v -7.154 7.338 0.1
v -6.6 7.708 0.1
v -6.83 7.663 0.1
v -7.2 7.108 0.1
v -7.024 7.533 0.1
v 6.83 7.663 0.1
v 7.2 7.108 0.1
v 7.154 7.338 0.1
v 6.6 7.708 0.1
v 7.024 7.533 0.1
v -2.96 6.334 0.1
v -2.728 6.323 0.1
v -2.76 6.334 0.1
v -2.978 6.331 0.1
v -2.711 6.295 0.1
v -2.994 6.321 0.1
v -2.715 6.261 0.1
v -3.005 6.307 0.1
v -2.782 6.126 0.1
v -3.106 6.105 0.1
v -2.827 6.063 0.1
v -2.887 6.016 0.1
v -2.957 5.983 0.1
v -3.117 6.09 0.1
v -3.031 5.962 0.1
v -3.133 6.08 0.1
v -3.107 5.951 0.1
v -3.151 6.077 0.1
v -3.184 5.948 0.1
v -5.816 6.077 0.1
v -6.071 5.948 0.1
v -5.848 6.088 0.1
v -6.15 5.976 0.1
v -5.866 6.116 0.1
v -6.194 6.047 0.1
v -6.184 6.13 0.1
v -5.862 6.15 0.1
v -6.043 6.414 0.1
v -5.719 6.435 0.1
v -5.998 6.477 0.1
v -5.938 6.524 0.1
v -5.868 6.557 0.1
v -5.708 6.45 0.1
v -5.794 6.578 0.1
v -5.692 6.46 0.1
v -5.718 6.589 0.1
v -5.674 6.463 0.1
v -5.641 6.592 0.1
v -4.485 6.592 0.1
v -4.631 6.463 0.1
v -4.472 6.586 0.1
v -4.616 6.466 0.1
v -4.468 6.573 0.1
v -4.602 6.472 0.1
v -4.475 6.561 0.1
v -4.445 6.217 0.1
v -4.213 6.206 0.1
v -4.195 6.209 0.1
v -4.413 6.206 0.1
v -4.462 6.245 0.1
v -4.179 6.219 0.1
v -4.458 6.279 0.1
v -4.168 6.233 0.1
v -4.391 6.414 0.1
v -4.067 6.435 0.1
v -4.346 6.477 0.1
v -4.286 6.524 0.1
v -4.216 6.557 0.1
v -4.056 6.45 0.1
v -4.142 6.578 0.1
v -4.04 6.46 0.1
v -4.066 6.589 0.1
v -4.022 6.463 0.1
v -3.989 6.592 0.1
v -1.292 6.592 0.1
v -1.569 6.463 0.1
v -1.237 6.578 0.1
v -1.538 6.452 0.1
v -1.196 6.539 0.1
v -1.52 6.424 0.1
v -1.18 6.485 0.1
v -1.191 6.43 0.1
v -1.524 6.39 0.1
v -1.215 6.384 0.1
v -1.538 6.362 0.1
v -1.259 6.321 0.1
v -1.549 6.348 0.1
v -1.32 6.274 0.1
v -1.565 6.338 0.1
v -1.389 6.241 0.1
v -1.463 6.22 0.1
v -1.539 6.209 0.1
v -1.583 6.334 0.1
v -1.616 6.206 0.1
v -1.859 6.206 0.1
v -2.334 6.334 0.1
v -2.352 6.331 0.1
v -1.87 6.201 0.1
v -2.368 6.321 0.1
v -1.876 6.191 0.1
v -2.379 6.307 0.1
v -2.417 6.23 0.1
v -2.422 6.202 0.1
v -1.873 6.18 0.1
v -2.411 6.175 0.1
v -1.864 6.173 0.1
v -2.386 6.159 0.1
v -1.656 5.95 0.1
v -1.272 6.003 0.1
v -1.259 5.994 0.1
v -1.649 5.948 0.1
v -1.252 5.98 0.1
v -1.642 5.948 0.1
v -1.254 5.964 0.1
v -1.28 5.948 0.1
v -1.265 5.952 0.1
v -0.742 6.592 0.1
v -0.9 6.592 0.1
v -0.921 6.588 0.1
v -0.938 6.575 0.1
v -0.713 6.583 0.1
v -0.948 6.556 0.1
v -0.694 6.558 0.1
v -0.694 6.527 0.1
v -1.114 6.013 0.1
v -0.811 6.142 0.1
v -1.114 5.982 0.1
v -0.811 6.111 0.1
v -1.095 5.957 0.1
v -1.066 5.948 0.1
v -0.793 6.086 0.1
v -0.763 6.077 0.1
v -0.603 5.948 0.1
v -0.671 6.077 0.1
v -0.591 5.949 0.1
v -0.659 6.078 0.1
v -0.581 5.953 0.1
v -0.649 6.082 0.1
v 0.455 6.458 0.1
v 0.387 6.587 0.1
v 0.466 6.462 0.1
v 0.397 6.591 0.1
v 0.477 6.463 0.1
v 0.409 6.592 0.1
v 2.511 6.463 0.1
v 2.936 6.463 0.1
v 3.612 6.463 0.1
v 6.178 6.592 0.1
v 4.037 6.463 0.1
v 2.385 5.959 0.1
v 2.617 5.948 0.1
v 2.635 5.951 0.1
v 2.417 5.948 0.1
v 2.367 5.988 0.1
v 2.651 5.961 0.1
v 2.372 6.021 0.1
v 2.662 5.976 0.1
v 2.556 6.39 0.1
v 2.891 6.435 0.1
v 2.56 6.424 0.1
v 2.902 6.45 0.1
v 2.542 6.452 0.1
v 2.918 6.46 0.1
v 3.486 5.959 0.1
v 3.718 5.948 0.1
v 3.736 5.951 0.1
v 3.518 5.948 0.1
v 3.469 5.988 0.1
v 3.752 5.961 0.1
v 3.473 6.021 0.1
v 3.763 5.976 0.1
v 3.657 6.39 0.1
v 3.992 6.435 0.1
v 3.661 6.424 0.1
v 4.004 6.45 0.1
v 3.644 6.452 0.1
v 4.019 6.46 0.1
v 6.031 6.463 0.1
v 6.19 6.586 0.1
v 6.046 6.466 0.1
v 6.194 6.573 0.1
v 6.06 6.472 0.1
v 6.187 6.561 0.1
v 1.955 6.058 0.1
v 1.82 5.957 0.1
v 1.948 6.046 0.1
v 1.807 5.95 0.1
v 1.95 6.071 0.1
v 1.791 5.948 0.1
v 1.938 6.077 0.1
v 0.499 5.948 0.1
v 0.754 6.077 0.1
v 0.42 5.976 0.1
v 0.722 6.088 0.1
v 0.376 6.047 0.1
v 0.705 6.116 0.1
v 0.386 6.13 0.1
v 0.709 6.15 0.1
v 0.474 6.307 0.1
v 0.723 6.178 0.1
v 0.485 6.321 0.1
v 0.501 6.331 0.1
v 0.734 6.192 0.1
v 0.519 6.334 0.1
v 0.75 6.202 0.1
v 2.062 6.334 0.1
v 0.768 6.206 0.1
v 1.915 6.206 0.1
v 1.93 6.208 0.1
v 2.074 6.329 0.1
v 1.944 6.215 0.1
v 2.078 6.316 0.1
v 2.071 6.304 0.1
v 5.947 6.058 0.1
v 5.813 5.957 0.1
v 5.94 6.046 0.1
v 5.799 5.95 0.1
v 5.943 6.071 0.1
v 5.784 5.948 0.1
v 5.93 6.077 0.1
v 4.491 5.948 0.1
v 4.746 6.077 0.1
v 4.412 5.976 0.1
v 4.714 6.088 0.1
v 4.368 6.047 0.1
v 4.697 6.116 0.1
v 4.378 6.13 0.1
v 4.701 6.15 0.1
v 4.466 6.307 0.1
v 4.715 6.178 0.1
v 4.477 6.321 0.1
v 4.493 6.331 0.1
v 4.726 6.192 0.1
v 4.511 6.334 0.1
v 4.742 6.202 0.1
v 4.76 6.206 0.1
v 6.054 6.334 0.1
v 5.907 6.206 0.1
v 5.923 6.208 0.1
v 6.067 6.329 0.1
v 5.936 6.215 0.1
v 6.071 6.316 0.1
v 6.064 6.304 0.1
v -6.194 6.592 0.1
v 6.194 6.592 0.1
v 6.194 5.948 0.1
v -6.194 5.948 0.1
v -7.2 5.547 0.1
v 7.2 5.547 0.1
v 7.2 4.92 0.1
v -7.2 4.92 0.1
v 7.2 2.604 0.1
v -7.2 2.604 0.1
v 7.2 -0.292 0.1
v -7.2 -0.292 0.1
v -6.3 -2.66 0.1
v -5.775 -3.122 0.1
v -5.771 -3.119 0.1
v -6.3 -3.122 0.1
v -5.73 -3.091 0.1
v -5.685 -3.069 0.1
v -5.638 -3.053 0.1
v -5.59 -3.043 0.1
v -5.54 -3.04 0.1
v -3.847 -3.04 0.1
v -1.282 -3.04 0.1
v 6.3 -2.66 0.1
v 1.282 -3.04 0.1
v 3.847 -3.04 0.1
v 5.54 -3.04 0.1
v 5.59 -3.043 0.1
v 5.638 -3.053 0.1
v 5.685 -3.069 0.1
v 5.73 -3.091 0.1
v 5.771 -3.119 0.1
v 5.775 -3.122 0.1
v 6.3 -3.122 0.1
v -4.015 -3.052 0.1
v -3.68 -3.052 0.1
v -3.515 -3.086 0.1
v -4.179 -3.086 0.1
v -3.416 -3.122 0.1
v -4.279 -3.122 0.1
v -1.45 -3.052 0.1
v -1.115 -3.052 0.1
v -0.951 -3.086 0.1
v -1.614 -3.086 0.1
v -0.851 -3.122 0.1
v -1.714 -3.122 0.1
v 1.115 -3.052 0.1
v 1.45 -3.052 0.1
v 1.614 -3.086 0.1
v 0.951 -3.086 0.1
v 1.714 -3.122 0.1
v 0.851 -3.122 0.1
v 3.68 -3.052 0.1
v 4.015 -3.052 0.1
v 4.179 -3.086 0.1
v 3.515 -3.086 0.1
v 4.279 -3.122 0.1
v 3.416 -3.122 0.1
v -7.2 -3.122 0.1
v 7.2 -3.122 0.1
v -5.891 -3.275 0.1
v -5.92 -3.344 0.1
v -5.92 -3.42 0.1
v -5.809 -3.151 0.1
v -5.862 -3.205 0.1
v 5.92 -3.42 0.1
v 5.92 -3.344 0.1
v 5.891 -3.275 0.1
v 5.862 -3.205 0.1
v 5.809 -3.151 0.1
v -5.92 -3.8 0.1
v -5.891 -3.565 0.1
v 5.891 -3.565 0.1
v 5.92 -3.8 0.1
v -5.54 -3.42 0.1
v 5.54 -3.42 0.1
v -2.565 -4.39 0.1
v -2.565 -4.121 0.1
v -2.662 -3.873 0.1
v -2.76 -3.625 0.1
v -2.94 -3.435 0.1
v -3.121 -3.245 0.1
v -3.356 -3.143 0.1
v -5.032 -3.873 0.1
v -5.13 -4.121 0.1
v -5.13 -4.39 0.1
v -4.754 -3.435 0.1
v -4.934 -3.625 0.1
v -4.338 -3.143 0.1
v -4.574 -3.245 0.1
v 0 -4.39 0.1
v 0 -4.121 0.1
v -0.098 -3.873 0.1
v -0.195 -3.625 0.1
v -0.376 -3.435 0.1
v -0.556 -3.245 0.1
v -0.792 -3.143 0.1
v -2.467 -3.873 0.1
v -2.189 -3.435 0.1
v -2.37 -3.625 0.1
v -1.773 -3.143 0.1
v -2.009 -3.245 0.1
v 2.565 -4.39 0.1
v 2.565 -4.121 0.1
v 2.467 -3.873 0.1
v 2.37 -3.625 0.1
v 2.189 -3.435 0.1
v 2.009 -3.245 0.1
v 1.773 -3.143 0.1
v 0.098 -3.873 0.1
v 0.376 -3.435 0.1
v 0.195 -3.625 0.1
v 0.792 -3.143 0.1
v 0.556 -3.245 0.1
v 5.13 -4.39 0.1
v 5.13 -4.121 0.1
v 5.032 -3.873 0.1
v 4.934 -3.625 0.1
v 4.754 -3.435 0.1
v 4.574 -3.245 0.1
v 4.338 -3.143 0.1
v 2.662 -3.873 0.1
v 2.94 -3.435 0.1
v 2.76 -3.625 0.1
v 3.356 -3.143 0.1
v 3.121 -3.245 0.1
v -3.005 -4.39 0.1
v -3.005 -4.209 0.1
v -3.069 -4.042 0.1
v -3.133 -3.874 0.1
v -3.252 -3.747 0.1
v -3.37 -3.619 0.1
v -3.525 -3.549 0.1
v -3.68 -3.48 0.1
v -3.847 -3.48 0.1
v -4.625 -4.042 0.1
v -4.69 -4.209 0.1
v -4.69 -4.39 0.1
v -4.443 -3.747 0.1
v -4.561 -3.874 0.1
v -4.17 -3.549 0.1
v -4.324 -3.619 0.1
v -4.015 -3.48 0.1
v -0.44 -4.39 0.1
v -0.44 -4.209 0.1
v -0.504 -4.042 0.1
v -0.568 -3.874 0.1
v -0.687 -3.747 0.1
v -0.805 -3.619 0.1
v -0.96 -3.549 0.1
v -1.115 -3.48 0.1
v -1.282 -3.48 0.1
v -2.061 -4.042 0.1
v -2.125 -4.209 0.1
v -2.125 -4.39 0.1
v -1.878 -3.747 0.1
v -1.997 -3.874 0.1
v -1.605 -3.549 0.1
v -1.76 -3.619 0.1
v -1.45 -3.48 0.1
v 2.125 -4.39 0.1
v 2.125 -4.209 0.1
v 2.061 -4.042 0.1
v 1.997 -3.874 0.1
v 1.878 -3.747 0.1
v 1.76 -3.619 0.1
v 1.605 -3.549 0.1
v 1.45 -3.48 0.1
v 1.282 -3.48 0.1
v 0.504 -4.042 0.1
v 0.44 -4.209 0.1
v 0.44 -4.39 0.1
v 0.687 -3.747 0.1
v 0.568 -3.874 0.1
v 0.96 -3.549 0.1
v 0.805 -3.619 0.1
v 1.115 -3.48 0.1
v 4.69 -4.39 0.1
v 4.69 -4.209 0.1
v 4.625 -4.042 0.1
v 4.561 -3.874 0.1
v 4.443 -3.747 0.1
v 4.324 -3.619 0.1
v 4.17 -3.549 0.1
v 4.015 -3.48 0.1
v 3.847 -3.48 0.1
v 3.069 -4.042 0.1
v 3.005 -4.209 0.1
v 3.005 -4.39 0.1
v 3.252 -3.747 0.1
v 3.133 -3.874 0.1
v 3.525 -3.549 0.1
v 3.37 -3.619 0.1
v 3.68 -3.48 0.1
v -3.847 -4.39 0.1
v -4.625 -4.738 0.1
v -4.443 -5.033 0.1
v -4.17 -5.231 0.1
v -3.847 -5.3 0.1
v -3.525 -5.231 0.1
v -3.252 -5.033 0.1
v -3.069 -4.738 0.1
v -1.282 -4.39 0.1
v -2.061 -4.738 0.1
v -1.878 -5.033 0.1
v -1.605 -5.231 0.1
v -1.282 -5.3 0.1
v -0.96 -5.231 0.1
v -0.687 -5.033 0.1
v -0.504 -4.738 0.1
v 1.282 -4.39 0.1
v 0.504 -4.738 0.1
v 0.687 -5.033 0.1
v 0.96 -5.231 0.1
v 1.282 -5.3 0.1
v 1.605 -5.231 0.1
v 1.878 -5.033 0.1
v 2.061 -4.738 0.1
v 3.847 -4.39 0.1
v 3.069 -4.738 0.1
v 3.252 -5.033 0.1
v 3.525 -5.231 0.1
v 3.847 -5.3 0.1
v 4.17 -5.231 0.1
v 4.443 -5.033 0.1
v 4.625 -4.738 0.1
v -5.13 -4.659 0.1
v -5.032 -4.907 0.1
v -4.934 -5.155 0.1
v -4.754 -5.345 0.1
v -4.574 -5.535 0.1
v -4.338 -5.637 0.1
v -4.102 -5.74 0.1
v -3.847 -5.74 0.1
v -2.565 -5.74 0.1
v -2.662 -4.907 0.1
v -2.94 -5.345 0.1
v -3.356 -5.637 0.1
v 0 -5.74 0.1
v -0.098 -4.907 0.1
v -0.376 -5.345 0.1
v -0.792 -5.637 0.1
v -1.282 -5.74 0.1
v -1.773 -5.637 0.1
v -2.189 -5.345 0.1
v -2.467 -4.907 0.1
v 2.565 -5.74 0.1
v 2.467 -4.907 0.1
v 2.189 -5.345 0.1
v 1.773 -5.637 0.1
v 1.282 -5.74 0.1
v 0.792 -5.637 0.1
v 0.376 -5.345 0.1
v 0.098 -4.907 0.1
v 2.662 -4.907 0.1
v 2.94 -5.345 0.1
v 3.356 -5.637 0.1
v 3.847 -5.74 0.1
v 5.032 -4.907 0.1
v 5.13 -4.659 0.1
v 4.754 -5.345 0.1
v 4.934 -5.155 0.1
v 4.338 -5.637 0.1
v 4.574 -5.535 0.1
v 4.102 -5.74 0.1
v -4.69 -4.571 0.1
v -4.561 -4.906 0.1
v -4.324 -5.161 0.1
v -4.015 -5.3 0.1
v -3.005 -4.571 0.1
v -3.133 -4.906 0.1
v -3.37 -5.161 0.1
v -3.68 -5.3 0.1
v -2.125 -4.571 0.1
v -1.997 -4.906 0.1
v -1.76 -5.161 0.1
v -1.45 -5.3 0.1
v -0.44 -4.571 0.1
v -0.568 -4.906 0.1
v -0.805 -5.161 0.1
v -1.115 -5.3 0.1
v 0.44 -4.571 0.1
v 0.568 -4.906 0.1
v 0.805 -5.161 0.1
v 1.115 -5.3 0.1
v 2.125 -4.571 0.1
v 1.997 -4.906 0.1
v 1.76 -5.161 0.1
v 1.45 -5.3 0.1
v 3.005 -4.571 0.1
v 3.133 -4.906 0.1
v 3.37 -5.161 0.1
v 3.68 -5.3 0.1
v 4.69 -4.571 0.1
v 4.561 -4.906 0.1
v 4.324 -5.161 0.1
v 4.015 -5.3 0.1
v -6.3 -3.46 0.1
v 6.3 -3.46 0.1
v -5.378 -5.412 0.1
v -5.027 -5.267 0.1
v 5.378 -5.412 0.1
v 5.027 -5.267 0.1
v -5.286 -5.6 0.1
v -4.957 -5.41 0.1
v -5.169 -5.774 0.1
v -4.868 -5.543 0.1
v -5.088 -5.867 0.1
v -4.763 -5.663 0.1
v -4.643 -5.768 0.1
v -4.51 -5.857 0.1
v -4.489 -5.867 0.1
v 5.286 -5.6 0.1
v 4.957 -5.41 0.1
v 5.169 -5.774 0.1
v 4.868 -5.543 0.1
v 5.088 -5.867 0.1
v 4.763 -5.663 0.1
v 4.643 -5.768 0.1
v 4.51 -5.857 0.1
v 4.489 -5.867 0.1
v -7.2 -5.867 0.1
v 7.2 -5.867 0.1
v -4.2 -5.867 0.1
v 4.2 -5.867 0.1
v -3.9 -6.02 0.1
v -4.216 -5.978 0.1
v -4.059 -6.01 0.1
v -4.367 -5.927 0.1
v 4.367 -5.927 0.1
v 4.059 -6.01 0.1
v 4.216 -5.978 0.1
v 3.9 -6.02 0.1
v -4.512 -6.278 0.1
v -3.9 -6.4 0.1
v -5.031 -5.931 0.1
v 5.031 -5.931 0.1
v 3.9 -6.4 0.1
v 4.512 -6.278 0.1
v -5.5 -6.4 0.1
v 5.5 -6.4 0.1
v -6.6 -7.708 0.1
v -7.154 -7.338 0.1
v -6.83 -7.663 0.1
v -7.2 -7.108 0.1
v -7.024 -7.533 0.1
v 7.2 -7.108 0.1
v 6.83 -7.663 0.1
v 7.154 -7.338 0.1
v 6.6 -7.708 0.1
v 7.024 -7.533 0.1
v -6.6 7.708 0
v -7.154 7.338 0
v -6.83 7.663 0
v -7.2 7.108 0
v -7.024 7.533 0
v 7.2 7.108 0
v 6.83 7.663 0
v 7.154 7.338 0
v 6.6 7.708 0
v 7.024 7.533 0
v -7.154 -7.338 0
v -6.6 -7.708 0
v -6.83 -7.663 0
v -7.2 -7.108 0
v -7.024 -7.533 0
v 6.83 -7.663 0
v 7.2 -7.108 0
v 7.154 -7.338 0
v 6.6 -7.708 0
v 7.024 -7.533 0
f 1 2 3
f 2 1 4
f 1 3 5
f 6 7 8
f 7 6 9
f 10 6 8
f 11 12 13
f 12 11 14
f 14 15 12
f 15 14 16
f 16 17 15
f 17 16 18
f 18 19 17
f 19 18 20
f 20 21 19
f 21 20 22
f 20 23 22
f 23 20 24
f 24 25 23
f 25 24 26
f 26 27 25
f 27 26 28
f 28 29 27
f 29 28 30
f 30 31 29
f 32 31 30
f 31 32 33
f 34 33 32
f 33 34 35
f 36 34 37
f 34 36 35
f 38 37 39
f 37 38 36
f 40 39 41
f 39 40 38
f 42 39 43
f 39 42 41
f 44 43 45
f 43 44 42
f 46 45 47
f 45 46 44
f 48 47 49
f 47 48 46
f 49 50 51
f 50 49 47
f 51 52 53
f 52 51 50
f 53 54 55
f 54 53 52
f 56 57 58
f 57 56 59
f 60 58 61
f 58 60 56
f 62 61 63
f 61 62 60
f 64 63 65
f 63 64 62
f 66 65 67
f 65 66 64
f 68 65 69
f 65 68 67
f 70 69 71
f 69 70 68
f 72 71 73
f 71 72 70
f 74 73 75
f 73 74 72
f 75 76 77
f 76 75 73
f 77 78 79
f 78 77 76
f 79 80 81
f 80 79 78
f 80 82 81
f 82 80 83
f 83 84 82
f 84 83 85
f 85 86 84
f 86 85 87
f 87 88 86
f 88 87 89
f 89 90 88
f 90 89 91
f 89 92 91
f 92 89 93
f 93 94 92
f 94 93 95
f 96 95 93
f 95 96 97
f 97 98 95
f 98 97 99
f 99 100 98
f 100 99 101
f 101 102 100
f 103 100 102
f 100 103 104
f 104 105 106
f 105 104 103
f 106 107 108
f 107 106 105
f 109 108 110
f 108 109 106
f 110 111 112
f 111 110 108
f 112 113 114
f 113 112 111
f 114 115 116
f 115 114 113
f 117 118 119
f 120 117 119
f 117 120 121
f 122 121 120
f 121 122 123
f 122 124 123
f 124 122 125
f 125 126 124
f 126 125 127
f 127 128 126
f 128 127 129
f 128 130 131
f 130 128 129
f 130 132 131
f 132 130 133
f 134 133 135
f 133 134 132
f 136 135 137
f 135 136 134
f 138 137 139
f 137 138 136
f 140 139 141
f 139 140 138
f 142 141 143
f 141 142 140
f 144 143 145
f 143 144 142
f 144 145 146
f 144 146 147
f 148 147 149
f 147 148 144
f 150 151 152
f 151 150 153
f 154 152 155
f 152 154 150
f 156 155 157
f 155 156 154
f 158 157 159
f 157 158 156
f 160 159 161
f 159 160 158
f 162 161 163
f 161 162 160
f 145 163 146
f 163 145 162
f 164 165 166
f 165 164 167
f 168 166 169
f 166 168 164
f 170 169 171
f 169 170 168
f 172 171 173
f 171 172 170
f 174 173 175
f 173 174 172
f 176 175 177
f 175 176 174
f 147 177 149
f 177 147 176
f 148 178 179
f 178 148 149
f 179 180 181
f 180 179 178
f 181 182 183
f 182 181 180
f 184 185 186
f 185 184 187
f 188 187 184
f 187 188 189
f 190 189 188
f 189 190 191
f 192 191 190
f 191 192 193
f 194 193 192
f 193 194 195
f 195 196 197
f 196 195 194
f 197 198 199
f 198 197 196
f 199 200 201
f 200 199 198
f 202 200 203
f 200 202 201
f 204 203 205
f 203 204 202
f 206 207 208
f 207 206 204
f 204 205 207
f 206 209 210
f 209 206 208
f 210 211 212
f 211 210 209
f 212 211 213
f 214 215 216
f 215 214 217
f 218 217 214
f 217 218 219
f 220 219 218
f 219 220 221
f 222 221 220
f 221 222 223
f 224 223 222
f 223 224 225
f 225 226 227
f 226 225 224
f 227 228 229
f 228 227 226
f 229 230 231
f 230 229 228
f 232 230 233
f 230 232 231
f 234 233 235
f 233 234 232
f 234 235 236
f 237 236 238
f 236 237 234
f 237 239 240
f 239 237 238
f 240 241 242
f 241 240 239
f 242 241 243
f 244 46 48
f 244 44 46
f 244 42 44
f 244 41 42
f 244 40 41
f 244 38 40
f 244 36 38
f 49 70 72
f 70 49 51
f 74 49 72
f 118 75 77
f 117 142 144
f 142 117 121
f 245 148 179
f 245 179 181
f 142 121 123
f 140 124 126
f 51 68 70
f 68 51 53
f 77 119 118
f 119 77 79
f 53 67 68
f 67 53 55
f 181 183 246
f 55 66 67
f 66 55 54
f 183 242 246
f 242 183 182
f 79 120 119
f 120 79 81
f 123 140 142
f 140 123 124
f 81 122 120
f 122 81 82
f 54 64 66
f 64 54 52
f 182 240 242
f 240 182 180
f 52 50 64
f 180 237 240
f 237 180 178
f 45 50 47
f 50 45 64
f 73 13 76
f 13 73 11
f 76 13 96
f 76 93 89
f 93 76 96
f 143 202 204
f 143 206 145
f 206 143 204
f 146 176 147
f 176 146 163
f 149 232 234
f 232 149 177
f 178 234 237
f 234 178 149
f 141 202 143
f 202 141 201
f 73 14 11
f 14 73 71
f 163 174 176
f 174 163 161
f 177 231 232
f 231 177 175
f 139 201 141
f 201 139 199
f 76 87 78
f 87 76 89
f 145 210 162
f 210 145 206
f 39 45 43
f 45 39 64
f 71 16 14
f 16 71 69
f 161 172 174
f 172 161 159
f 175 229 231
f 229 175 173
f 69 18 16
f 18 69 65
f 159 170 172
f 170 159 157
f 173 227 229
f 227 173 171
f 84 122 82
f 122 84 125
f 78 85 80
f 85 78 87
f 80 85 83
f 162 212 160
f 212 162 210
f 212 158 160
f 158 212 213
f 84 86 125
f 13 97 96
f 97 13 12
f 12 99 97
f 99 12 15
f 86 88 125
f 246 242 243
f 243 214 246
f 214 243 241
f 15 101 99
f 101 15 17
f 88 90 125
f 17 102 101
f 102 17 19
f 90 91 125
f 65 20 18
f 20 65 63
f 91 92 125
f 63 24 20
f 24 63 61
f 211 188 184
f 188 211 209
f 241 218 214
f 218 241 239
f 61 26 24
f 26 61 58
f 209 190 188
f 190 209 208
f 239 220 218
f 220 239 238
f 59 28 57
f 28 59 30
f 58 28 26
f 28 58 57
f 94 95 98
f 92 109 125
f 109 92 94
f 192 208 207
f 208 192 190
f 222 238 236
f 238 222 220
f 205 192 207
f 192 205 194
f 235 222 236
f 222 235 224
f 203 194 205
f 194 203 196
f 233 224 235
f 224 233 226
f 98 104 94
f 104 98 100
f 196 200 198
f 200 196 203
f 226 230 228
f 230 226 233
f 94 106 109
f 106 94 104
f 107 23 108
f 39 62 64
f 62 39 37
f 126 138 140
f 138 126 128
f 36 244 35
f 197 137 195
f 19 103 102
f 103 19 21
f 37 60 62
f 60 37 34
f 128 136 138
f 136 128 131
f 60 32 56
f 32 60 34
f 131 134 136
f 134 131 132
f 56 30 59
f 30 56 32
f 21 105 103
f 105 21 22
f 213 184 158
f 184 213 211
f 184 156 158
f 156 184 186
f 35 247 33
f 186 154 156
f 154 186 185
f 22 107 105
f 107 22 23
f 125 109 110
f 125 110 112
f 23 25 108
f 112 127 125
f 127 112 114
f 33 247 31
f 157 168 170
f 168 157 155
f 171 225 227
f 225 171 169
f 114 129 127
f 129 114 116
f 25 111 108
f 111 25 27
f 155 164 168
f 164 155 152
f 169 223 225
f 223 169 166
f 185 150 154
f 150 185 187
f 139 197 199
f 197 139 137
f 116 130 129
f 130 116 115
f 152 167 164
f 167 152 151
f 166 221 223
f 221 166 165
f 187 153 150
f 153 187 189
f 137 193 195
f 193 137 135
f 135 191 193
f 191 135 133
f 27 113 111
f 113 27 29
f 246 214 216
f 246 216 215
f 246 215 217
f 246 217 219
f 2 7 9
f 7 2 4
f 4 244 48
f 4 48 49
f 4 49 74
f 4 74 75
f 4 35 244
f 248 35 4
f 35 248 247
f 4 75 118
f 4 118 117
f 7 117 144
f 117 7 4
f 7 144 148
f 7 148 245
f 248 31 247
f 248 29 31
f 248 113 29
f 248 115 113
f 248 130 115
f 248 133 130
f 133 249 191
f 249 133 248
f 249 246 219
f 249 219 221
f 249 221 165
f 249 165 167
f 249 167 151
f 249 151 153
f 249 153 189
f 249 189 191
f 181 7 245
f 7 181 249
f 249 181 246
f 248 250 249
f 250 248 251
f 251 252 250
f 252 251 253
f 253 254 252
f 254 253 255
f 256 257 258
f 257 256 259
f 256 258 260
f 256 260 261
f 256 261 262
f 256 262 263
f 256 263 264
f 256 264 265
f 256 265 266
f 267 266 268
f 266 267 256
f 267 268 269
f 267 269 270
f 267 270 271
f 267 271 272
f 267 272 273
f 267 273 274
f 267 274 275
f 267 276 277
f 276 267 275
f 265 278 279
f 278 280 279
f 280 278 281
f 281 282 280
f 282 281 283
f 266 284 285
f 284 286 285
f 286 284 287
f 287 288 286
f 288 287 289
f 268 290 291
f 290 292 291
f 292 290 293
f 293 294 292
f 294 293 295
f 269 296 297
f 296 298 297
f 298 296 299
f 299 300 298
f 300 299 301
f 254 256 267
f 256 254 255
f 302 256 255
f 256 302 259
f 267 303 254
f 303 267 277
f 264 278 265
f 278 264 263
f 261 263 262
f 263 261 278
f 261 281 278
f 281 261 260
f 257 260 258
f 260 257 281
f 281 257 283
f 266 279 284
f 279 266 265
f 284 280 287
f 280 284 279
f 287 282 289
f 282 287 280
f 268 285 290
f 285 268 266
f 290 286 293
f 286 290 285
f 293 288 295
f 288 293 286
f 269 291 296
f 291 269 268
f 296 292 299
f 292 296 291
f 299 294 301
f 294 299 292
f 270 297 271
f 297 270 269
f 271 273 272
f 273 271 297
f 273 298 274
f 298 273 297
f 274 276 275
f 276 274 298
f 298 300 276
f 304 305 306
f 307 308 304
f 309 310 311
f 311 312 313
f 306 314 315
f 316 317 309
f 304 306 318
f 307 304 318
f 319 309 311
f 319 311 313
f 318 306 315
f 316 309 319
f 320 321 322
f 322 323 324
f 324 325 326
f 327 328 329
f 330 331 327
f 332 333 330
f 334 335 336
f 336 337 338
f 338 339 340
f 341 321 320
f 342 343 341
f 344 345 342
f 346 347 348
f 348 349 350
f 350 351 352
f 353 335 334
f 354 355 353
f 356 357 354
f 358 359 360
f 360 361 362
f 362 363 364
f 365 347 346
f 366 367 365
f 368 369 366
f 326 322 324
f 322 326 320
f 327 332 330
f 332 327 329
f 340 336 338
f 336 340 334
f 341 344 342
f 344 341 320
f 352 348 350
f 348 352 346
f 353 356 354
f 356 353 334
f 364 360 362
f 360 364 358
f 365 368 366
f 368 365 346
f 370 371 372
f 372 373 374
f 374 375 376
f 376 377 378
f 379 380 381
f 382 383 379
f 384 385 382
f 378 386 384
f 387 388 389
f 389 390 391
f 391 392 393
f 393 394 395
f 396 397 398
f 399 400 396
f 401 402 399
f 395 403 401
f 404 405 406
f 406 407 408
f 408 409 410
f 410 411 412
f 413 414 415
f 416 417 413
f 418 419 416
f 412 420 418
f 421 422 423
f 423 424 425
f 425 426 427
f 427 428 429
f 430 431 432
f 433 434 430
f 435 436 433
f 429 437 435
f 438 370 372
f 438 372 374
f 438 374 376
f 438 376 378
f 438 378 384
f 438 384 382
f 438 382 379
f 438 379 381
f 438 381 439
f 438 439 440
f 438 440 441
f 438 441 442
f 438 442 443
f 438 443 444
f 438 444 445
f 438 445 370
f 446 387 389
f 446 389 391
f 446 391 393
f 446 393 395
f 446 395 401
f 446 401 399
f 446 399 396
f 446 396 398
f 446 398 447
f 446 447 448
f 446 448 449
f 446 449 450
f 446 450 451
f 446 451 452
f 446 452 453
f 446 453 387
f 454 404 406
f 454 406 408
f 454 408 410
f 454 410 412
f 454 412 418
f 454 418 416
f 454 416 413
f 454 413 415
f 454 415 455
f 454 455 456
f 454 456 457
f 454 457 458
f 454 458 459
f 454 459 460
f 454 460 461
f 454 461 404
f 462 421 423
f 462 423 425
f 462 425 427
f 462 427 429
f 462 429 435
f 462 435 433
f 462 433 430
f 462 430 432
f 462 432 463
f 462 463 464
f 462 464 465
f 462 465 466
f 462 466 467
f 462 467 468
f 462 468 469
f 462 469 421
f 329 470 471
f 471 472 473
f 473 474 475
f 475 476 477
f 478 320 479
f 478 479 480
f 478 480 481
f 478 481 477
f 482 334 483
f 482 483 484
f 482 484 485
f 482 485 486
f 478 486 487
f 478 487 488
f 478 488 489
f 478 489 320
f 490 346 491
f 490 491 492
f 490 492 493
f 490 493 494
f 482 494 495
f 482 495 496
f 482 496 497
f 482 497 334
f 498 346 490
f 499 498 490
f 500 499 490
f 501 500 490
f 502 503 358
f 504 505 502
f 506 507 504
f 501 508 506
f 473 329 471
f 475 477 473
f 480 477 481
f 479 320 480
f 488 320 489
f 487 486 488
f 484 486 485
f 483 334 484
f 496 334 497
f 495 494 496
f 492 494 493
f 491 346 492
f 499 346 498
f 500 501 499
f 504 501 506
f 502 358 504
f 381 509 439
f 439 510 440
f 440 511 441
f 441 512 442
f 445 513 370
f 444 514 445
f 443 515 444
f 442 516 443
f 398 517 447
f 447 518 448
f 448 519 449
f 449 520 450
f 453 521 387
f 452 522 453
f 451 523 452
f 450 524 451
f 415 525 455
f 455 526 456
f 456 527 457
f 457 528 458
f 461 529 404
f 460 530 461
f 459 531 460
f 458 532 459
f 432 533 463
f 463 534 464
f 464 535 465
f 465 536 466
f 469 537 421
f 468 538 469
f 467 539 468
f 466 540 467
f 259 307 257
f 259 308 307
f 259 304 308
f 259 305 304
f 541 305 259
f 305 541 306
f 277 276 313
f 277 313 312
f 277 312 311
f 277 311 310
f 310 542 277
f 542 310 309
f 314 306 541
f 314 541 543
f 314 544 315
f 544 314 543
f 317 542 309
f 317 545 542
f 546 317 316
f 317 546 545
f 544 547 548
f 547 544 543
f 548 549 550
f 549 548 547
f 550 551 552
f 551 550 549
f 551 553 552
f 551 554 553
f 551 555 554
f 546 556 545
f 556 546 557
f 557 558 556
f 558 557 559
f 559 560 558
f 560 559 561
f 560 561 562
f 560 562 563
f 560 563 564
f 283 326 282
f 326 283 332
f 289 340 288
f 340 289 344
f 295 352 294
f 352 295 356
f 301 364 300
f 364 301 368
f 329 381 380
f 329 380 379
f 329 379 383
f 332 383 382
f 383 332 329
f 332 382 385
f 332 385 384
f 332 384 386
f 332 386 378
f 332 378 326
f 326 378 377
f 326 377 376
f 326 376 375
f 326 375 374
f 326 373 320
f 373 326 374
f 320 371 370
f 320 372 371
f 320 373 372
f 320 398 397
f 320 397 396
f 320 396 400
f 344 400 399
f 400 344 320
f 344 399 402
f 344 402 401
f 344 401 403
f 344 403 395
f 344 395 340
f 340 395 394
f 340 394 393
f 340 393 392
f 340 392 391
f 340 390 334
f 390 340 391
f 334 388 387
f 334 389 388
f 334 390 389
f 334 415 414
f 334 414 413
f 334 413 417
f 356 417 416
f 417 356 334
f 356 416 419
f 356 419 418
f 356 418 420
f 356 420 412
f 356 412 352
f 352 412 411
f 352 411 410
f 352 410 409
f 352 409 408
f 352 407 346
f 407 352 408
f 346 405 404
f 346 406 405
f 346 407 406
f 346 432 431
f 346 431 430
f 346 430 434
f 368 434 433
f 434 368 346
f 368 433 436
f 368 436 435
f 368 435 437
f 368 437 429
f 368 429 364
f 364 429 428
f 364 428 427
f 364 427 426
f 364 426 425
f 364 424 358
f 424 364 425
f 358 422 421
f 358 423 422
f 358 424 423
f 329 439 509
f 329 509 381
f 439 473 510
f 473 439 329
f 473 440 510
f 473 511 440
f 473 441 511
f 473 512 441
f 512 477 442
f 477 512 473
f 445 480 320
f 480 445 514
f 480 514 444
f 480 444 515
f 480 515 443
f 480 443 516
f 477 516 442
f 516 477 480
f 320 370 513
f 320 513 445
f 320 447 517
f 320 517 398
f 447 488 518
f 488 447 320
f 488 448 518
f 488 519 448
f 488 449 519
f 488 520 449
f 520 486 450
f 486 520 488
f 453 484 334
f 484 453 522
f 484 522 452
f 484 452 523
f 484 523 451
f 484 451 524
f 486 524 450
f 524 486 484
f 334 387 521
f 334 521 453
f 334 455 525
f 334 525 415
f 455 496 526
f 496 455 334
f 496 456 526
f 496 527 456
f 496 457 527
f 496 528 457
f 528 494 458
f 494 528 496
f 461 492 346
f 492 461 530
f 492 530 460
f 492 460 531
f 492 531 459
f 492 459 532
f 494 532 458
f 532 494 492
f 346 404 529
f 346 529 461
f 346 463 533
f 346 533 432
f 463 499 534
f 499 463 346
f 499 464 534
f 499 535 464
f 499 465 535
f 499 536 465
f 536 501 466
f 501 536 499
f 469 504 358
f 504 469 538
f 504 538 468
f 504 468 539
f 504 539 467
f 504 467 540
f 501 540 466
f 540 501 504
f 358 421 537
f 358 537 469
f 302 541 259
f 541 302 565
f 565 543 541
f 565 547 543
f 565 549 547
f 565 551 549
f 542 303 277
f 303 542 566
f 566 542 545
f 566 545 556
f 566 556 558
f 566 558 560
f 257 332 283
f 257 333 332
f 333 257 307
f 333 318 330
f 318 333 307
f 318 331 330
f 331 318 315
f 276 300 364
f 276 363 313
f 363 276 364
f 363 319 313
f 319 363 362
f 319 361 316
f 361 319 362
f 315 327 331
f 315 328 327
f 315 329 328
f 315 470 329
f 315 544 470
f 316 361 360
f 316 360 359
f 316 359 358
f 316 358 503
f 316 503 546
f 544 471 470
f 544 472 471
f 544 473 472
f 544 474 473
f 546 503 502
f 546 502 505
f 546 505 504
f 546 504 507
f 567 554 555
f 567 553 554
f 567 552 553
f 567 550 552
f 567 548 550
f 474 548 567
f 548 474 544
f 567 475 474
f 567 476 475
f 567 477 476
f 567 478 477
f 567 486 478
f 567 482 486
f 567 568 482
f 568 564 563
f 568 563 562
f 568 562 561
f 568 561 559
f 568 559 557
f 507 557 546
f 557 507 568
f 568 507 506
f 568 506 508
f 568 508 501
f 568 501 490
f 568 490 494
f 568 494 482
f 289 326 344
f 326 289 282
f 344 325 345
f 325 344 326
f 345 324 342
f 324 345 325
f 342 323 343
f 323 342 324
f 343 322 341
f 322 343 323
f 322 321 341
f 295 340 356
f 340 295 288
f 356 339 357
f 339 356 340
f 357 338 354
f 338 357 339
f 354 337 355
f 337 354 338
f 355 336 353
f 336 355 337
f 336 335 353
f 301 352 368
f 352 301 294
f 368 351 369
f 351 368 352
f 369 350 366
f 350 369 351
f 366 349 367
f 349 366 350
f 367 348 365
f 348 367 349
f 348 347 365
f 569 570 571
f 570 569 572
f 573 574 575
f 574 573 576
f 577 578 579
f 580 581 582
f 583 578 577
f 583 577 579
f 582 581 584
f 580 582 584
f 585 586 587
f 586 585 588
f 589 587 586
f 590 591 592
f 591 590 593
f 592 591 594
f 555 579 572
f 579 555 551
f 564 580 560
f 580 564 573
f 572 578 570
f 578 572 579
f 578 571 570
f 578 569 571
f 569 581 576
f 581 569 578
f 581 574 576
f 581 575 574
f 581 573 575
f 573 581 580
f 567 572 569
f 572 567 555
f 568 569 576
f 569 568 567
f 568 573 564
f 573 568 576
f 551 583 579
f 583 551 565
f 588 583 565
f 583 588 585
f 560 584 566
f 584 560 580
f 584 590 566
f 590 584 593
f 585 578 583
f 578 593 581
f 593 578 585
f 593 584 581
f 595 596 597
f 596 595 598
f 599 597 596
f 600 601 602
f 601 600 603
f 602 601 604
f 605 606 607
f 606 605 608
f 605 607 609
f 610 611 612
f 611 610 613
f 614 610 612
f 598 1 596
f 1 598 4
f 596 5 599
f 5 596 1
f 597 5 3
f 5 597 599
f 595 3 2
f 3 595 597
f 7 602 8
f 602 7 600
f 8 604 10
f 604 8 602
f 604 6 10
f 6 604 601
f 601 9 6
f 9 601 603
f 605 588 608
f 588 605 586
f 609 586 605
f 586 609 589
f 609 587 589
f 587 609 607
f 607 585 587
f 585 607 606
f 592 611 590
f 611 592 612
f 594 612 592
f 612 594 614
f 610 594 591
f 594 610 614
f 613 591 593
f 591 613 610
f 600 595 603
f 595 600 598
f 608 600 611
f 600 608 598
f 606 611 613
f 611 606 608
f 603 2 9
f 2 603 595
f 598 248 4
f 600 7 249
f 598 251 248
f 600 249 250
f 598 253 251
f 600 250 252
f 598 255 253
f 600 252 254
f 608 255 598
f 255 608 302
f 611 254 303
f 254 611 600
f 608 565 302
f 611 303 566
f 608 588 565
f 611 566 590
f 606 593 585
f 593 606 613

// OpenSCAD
use <../lib.scad>
use <s/6142622as01.scad>
use <s/6142622as02.scad>
use <s/6142622as03.scad>
use <s/6142622as04.scad>
use <s/6142622as05.scad>
use <s/6142622as06.scad>
function ldraw_lib__6142622a() = [
// 0 Sticker  1.9 x  1.8 with Dark Grey Exhaust Pipes on Black Background and Black "CORVETTE" on Yellow Background
// 0 Name: 6142622a.dat
// 0 Author: Massimo Maso [Sirio]
// 0 !LDRAW_ORG Part UPDATE 2022-03
// 0 !LICENSE Licensed under CC BY 2.0 and CC BY 4.0 : see CAreadme.txt
// 
// 0 BFC CERTIFY CCW
  [0,"BFC","CERTIFY"],
  [0,"BFC","CCW"],
// 
// 0 !KEYWORDS Chevrolet, Corvette, Set 75870, Speed Champions, Z06-C7
// 
// 0 !HISTORY 2022-05-07 [PTadmin] Official Update 2022-03
// 
// 
// 1 16 0 0 13.8789 1 0 0 0 1 0 0 0 1 s\6142622as01.dat
  [1,16,0,0,13.8789,1,0,0,0,1,0,0,0,1, ldraw_lib__s__6142622as01()],
// 1 16 0 0 13.8547 1 0 0 0 1 0 0 0 1 s\6142622as02.dat
  [1,16,0,0,13.8547,1,0,0,0,1,0,0,0,1, ldraw_lib__s__6142622as02()],
// 4 0 -18 -.25 6.5112 -18 -.25 -.73 18 -.25 -.73 18 -.25 6.5112
  [4,0,-18,-.25,6.5112,-18,-.25,-.73,18,-.25,-.73,18,-.25,6.5112],
// 1 16 0 0 -.7428 1 0 0 0 1 0 0 0 1 s\6142622as03.dat
  [1,16,0,0,-.7428,1,0,0,0,1,0,0,0,1, ldraw_lib__s__6142622as03()],
// 1 16 0 0 -14.6522 1 0 0 0 1 0 0 0 1 s\6142622as04.dat
  [1,16,0,0,-14.6522,1,0,0,0,1,0,0,0,1, ldraw_lib__s__6142622as04()],
// 1 16 0 0 -14.6810 1 0 0 0 1 0 0 0 1 s\6142622as05.dat
  [1,16,0,0,-14.6810,1,0,0,0,1,0,0,0,1, ldraw_lib__s__6142622as05()],
// 1 16 0 0 0 1 0 0 0 1 0 0 0 1 s\6142622as06.dat
  [1,16,0,0,0,1,0,0,0,1,0,0,0,1, ldraw_lib__s__6142622as06()],
];
makepoly(ldraw_lib__6142622a(), line=0.2);
